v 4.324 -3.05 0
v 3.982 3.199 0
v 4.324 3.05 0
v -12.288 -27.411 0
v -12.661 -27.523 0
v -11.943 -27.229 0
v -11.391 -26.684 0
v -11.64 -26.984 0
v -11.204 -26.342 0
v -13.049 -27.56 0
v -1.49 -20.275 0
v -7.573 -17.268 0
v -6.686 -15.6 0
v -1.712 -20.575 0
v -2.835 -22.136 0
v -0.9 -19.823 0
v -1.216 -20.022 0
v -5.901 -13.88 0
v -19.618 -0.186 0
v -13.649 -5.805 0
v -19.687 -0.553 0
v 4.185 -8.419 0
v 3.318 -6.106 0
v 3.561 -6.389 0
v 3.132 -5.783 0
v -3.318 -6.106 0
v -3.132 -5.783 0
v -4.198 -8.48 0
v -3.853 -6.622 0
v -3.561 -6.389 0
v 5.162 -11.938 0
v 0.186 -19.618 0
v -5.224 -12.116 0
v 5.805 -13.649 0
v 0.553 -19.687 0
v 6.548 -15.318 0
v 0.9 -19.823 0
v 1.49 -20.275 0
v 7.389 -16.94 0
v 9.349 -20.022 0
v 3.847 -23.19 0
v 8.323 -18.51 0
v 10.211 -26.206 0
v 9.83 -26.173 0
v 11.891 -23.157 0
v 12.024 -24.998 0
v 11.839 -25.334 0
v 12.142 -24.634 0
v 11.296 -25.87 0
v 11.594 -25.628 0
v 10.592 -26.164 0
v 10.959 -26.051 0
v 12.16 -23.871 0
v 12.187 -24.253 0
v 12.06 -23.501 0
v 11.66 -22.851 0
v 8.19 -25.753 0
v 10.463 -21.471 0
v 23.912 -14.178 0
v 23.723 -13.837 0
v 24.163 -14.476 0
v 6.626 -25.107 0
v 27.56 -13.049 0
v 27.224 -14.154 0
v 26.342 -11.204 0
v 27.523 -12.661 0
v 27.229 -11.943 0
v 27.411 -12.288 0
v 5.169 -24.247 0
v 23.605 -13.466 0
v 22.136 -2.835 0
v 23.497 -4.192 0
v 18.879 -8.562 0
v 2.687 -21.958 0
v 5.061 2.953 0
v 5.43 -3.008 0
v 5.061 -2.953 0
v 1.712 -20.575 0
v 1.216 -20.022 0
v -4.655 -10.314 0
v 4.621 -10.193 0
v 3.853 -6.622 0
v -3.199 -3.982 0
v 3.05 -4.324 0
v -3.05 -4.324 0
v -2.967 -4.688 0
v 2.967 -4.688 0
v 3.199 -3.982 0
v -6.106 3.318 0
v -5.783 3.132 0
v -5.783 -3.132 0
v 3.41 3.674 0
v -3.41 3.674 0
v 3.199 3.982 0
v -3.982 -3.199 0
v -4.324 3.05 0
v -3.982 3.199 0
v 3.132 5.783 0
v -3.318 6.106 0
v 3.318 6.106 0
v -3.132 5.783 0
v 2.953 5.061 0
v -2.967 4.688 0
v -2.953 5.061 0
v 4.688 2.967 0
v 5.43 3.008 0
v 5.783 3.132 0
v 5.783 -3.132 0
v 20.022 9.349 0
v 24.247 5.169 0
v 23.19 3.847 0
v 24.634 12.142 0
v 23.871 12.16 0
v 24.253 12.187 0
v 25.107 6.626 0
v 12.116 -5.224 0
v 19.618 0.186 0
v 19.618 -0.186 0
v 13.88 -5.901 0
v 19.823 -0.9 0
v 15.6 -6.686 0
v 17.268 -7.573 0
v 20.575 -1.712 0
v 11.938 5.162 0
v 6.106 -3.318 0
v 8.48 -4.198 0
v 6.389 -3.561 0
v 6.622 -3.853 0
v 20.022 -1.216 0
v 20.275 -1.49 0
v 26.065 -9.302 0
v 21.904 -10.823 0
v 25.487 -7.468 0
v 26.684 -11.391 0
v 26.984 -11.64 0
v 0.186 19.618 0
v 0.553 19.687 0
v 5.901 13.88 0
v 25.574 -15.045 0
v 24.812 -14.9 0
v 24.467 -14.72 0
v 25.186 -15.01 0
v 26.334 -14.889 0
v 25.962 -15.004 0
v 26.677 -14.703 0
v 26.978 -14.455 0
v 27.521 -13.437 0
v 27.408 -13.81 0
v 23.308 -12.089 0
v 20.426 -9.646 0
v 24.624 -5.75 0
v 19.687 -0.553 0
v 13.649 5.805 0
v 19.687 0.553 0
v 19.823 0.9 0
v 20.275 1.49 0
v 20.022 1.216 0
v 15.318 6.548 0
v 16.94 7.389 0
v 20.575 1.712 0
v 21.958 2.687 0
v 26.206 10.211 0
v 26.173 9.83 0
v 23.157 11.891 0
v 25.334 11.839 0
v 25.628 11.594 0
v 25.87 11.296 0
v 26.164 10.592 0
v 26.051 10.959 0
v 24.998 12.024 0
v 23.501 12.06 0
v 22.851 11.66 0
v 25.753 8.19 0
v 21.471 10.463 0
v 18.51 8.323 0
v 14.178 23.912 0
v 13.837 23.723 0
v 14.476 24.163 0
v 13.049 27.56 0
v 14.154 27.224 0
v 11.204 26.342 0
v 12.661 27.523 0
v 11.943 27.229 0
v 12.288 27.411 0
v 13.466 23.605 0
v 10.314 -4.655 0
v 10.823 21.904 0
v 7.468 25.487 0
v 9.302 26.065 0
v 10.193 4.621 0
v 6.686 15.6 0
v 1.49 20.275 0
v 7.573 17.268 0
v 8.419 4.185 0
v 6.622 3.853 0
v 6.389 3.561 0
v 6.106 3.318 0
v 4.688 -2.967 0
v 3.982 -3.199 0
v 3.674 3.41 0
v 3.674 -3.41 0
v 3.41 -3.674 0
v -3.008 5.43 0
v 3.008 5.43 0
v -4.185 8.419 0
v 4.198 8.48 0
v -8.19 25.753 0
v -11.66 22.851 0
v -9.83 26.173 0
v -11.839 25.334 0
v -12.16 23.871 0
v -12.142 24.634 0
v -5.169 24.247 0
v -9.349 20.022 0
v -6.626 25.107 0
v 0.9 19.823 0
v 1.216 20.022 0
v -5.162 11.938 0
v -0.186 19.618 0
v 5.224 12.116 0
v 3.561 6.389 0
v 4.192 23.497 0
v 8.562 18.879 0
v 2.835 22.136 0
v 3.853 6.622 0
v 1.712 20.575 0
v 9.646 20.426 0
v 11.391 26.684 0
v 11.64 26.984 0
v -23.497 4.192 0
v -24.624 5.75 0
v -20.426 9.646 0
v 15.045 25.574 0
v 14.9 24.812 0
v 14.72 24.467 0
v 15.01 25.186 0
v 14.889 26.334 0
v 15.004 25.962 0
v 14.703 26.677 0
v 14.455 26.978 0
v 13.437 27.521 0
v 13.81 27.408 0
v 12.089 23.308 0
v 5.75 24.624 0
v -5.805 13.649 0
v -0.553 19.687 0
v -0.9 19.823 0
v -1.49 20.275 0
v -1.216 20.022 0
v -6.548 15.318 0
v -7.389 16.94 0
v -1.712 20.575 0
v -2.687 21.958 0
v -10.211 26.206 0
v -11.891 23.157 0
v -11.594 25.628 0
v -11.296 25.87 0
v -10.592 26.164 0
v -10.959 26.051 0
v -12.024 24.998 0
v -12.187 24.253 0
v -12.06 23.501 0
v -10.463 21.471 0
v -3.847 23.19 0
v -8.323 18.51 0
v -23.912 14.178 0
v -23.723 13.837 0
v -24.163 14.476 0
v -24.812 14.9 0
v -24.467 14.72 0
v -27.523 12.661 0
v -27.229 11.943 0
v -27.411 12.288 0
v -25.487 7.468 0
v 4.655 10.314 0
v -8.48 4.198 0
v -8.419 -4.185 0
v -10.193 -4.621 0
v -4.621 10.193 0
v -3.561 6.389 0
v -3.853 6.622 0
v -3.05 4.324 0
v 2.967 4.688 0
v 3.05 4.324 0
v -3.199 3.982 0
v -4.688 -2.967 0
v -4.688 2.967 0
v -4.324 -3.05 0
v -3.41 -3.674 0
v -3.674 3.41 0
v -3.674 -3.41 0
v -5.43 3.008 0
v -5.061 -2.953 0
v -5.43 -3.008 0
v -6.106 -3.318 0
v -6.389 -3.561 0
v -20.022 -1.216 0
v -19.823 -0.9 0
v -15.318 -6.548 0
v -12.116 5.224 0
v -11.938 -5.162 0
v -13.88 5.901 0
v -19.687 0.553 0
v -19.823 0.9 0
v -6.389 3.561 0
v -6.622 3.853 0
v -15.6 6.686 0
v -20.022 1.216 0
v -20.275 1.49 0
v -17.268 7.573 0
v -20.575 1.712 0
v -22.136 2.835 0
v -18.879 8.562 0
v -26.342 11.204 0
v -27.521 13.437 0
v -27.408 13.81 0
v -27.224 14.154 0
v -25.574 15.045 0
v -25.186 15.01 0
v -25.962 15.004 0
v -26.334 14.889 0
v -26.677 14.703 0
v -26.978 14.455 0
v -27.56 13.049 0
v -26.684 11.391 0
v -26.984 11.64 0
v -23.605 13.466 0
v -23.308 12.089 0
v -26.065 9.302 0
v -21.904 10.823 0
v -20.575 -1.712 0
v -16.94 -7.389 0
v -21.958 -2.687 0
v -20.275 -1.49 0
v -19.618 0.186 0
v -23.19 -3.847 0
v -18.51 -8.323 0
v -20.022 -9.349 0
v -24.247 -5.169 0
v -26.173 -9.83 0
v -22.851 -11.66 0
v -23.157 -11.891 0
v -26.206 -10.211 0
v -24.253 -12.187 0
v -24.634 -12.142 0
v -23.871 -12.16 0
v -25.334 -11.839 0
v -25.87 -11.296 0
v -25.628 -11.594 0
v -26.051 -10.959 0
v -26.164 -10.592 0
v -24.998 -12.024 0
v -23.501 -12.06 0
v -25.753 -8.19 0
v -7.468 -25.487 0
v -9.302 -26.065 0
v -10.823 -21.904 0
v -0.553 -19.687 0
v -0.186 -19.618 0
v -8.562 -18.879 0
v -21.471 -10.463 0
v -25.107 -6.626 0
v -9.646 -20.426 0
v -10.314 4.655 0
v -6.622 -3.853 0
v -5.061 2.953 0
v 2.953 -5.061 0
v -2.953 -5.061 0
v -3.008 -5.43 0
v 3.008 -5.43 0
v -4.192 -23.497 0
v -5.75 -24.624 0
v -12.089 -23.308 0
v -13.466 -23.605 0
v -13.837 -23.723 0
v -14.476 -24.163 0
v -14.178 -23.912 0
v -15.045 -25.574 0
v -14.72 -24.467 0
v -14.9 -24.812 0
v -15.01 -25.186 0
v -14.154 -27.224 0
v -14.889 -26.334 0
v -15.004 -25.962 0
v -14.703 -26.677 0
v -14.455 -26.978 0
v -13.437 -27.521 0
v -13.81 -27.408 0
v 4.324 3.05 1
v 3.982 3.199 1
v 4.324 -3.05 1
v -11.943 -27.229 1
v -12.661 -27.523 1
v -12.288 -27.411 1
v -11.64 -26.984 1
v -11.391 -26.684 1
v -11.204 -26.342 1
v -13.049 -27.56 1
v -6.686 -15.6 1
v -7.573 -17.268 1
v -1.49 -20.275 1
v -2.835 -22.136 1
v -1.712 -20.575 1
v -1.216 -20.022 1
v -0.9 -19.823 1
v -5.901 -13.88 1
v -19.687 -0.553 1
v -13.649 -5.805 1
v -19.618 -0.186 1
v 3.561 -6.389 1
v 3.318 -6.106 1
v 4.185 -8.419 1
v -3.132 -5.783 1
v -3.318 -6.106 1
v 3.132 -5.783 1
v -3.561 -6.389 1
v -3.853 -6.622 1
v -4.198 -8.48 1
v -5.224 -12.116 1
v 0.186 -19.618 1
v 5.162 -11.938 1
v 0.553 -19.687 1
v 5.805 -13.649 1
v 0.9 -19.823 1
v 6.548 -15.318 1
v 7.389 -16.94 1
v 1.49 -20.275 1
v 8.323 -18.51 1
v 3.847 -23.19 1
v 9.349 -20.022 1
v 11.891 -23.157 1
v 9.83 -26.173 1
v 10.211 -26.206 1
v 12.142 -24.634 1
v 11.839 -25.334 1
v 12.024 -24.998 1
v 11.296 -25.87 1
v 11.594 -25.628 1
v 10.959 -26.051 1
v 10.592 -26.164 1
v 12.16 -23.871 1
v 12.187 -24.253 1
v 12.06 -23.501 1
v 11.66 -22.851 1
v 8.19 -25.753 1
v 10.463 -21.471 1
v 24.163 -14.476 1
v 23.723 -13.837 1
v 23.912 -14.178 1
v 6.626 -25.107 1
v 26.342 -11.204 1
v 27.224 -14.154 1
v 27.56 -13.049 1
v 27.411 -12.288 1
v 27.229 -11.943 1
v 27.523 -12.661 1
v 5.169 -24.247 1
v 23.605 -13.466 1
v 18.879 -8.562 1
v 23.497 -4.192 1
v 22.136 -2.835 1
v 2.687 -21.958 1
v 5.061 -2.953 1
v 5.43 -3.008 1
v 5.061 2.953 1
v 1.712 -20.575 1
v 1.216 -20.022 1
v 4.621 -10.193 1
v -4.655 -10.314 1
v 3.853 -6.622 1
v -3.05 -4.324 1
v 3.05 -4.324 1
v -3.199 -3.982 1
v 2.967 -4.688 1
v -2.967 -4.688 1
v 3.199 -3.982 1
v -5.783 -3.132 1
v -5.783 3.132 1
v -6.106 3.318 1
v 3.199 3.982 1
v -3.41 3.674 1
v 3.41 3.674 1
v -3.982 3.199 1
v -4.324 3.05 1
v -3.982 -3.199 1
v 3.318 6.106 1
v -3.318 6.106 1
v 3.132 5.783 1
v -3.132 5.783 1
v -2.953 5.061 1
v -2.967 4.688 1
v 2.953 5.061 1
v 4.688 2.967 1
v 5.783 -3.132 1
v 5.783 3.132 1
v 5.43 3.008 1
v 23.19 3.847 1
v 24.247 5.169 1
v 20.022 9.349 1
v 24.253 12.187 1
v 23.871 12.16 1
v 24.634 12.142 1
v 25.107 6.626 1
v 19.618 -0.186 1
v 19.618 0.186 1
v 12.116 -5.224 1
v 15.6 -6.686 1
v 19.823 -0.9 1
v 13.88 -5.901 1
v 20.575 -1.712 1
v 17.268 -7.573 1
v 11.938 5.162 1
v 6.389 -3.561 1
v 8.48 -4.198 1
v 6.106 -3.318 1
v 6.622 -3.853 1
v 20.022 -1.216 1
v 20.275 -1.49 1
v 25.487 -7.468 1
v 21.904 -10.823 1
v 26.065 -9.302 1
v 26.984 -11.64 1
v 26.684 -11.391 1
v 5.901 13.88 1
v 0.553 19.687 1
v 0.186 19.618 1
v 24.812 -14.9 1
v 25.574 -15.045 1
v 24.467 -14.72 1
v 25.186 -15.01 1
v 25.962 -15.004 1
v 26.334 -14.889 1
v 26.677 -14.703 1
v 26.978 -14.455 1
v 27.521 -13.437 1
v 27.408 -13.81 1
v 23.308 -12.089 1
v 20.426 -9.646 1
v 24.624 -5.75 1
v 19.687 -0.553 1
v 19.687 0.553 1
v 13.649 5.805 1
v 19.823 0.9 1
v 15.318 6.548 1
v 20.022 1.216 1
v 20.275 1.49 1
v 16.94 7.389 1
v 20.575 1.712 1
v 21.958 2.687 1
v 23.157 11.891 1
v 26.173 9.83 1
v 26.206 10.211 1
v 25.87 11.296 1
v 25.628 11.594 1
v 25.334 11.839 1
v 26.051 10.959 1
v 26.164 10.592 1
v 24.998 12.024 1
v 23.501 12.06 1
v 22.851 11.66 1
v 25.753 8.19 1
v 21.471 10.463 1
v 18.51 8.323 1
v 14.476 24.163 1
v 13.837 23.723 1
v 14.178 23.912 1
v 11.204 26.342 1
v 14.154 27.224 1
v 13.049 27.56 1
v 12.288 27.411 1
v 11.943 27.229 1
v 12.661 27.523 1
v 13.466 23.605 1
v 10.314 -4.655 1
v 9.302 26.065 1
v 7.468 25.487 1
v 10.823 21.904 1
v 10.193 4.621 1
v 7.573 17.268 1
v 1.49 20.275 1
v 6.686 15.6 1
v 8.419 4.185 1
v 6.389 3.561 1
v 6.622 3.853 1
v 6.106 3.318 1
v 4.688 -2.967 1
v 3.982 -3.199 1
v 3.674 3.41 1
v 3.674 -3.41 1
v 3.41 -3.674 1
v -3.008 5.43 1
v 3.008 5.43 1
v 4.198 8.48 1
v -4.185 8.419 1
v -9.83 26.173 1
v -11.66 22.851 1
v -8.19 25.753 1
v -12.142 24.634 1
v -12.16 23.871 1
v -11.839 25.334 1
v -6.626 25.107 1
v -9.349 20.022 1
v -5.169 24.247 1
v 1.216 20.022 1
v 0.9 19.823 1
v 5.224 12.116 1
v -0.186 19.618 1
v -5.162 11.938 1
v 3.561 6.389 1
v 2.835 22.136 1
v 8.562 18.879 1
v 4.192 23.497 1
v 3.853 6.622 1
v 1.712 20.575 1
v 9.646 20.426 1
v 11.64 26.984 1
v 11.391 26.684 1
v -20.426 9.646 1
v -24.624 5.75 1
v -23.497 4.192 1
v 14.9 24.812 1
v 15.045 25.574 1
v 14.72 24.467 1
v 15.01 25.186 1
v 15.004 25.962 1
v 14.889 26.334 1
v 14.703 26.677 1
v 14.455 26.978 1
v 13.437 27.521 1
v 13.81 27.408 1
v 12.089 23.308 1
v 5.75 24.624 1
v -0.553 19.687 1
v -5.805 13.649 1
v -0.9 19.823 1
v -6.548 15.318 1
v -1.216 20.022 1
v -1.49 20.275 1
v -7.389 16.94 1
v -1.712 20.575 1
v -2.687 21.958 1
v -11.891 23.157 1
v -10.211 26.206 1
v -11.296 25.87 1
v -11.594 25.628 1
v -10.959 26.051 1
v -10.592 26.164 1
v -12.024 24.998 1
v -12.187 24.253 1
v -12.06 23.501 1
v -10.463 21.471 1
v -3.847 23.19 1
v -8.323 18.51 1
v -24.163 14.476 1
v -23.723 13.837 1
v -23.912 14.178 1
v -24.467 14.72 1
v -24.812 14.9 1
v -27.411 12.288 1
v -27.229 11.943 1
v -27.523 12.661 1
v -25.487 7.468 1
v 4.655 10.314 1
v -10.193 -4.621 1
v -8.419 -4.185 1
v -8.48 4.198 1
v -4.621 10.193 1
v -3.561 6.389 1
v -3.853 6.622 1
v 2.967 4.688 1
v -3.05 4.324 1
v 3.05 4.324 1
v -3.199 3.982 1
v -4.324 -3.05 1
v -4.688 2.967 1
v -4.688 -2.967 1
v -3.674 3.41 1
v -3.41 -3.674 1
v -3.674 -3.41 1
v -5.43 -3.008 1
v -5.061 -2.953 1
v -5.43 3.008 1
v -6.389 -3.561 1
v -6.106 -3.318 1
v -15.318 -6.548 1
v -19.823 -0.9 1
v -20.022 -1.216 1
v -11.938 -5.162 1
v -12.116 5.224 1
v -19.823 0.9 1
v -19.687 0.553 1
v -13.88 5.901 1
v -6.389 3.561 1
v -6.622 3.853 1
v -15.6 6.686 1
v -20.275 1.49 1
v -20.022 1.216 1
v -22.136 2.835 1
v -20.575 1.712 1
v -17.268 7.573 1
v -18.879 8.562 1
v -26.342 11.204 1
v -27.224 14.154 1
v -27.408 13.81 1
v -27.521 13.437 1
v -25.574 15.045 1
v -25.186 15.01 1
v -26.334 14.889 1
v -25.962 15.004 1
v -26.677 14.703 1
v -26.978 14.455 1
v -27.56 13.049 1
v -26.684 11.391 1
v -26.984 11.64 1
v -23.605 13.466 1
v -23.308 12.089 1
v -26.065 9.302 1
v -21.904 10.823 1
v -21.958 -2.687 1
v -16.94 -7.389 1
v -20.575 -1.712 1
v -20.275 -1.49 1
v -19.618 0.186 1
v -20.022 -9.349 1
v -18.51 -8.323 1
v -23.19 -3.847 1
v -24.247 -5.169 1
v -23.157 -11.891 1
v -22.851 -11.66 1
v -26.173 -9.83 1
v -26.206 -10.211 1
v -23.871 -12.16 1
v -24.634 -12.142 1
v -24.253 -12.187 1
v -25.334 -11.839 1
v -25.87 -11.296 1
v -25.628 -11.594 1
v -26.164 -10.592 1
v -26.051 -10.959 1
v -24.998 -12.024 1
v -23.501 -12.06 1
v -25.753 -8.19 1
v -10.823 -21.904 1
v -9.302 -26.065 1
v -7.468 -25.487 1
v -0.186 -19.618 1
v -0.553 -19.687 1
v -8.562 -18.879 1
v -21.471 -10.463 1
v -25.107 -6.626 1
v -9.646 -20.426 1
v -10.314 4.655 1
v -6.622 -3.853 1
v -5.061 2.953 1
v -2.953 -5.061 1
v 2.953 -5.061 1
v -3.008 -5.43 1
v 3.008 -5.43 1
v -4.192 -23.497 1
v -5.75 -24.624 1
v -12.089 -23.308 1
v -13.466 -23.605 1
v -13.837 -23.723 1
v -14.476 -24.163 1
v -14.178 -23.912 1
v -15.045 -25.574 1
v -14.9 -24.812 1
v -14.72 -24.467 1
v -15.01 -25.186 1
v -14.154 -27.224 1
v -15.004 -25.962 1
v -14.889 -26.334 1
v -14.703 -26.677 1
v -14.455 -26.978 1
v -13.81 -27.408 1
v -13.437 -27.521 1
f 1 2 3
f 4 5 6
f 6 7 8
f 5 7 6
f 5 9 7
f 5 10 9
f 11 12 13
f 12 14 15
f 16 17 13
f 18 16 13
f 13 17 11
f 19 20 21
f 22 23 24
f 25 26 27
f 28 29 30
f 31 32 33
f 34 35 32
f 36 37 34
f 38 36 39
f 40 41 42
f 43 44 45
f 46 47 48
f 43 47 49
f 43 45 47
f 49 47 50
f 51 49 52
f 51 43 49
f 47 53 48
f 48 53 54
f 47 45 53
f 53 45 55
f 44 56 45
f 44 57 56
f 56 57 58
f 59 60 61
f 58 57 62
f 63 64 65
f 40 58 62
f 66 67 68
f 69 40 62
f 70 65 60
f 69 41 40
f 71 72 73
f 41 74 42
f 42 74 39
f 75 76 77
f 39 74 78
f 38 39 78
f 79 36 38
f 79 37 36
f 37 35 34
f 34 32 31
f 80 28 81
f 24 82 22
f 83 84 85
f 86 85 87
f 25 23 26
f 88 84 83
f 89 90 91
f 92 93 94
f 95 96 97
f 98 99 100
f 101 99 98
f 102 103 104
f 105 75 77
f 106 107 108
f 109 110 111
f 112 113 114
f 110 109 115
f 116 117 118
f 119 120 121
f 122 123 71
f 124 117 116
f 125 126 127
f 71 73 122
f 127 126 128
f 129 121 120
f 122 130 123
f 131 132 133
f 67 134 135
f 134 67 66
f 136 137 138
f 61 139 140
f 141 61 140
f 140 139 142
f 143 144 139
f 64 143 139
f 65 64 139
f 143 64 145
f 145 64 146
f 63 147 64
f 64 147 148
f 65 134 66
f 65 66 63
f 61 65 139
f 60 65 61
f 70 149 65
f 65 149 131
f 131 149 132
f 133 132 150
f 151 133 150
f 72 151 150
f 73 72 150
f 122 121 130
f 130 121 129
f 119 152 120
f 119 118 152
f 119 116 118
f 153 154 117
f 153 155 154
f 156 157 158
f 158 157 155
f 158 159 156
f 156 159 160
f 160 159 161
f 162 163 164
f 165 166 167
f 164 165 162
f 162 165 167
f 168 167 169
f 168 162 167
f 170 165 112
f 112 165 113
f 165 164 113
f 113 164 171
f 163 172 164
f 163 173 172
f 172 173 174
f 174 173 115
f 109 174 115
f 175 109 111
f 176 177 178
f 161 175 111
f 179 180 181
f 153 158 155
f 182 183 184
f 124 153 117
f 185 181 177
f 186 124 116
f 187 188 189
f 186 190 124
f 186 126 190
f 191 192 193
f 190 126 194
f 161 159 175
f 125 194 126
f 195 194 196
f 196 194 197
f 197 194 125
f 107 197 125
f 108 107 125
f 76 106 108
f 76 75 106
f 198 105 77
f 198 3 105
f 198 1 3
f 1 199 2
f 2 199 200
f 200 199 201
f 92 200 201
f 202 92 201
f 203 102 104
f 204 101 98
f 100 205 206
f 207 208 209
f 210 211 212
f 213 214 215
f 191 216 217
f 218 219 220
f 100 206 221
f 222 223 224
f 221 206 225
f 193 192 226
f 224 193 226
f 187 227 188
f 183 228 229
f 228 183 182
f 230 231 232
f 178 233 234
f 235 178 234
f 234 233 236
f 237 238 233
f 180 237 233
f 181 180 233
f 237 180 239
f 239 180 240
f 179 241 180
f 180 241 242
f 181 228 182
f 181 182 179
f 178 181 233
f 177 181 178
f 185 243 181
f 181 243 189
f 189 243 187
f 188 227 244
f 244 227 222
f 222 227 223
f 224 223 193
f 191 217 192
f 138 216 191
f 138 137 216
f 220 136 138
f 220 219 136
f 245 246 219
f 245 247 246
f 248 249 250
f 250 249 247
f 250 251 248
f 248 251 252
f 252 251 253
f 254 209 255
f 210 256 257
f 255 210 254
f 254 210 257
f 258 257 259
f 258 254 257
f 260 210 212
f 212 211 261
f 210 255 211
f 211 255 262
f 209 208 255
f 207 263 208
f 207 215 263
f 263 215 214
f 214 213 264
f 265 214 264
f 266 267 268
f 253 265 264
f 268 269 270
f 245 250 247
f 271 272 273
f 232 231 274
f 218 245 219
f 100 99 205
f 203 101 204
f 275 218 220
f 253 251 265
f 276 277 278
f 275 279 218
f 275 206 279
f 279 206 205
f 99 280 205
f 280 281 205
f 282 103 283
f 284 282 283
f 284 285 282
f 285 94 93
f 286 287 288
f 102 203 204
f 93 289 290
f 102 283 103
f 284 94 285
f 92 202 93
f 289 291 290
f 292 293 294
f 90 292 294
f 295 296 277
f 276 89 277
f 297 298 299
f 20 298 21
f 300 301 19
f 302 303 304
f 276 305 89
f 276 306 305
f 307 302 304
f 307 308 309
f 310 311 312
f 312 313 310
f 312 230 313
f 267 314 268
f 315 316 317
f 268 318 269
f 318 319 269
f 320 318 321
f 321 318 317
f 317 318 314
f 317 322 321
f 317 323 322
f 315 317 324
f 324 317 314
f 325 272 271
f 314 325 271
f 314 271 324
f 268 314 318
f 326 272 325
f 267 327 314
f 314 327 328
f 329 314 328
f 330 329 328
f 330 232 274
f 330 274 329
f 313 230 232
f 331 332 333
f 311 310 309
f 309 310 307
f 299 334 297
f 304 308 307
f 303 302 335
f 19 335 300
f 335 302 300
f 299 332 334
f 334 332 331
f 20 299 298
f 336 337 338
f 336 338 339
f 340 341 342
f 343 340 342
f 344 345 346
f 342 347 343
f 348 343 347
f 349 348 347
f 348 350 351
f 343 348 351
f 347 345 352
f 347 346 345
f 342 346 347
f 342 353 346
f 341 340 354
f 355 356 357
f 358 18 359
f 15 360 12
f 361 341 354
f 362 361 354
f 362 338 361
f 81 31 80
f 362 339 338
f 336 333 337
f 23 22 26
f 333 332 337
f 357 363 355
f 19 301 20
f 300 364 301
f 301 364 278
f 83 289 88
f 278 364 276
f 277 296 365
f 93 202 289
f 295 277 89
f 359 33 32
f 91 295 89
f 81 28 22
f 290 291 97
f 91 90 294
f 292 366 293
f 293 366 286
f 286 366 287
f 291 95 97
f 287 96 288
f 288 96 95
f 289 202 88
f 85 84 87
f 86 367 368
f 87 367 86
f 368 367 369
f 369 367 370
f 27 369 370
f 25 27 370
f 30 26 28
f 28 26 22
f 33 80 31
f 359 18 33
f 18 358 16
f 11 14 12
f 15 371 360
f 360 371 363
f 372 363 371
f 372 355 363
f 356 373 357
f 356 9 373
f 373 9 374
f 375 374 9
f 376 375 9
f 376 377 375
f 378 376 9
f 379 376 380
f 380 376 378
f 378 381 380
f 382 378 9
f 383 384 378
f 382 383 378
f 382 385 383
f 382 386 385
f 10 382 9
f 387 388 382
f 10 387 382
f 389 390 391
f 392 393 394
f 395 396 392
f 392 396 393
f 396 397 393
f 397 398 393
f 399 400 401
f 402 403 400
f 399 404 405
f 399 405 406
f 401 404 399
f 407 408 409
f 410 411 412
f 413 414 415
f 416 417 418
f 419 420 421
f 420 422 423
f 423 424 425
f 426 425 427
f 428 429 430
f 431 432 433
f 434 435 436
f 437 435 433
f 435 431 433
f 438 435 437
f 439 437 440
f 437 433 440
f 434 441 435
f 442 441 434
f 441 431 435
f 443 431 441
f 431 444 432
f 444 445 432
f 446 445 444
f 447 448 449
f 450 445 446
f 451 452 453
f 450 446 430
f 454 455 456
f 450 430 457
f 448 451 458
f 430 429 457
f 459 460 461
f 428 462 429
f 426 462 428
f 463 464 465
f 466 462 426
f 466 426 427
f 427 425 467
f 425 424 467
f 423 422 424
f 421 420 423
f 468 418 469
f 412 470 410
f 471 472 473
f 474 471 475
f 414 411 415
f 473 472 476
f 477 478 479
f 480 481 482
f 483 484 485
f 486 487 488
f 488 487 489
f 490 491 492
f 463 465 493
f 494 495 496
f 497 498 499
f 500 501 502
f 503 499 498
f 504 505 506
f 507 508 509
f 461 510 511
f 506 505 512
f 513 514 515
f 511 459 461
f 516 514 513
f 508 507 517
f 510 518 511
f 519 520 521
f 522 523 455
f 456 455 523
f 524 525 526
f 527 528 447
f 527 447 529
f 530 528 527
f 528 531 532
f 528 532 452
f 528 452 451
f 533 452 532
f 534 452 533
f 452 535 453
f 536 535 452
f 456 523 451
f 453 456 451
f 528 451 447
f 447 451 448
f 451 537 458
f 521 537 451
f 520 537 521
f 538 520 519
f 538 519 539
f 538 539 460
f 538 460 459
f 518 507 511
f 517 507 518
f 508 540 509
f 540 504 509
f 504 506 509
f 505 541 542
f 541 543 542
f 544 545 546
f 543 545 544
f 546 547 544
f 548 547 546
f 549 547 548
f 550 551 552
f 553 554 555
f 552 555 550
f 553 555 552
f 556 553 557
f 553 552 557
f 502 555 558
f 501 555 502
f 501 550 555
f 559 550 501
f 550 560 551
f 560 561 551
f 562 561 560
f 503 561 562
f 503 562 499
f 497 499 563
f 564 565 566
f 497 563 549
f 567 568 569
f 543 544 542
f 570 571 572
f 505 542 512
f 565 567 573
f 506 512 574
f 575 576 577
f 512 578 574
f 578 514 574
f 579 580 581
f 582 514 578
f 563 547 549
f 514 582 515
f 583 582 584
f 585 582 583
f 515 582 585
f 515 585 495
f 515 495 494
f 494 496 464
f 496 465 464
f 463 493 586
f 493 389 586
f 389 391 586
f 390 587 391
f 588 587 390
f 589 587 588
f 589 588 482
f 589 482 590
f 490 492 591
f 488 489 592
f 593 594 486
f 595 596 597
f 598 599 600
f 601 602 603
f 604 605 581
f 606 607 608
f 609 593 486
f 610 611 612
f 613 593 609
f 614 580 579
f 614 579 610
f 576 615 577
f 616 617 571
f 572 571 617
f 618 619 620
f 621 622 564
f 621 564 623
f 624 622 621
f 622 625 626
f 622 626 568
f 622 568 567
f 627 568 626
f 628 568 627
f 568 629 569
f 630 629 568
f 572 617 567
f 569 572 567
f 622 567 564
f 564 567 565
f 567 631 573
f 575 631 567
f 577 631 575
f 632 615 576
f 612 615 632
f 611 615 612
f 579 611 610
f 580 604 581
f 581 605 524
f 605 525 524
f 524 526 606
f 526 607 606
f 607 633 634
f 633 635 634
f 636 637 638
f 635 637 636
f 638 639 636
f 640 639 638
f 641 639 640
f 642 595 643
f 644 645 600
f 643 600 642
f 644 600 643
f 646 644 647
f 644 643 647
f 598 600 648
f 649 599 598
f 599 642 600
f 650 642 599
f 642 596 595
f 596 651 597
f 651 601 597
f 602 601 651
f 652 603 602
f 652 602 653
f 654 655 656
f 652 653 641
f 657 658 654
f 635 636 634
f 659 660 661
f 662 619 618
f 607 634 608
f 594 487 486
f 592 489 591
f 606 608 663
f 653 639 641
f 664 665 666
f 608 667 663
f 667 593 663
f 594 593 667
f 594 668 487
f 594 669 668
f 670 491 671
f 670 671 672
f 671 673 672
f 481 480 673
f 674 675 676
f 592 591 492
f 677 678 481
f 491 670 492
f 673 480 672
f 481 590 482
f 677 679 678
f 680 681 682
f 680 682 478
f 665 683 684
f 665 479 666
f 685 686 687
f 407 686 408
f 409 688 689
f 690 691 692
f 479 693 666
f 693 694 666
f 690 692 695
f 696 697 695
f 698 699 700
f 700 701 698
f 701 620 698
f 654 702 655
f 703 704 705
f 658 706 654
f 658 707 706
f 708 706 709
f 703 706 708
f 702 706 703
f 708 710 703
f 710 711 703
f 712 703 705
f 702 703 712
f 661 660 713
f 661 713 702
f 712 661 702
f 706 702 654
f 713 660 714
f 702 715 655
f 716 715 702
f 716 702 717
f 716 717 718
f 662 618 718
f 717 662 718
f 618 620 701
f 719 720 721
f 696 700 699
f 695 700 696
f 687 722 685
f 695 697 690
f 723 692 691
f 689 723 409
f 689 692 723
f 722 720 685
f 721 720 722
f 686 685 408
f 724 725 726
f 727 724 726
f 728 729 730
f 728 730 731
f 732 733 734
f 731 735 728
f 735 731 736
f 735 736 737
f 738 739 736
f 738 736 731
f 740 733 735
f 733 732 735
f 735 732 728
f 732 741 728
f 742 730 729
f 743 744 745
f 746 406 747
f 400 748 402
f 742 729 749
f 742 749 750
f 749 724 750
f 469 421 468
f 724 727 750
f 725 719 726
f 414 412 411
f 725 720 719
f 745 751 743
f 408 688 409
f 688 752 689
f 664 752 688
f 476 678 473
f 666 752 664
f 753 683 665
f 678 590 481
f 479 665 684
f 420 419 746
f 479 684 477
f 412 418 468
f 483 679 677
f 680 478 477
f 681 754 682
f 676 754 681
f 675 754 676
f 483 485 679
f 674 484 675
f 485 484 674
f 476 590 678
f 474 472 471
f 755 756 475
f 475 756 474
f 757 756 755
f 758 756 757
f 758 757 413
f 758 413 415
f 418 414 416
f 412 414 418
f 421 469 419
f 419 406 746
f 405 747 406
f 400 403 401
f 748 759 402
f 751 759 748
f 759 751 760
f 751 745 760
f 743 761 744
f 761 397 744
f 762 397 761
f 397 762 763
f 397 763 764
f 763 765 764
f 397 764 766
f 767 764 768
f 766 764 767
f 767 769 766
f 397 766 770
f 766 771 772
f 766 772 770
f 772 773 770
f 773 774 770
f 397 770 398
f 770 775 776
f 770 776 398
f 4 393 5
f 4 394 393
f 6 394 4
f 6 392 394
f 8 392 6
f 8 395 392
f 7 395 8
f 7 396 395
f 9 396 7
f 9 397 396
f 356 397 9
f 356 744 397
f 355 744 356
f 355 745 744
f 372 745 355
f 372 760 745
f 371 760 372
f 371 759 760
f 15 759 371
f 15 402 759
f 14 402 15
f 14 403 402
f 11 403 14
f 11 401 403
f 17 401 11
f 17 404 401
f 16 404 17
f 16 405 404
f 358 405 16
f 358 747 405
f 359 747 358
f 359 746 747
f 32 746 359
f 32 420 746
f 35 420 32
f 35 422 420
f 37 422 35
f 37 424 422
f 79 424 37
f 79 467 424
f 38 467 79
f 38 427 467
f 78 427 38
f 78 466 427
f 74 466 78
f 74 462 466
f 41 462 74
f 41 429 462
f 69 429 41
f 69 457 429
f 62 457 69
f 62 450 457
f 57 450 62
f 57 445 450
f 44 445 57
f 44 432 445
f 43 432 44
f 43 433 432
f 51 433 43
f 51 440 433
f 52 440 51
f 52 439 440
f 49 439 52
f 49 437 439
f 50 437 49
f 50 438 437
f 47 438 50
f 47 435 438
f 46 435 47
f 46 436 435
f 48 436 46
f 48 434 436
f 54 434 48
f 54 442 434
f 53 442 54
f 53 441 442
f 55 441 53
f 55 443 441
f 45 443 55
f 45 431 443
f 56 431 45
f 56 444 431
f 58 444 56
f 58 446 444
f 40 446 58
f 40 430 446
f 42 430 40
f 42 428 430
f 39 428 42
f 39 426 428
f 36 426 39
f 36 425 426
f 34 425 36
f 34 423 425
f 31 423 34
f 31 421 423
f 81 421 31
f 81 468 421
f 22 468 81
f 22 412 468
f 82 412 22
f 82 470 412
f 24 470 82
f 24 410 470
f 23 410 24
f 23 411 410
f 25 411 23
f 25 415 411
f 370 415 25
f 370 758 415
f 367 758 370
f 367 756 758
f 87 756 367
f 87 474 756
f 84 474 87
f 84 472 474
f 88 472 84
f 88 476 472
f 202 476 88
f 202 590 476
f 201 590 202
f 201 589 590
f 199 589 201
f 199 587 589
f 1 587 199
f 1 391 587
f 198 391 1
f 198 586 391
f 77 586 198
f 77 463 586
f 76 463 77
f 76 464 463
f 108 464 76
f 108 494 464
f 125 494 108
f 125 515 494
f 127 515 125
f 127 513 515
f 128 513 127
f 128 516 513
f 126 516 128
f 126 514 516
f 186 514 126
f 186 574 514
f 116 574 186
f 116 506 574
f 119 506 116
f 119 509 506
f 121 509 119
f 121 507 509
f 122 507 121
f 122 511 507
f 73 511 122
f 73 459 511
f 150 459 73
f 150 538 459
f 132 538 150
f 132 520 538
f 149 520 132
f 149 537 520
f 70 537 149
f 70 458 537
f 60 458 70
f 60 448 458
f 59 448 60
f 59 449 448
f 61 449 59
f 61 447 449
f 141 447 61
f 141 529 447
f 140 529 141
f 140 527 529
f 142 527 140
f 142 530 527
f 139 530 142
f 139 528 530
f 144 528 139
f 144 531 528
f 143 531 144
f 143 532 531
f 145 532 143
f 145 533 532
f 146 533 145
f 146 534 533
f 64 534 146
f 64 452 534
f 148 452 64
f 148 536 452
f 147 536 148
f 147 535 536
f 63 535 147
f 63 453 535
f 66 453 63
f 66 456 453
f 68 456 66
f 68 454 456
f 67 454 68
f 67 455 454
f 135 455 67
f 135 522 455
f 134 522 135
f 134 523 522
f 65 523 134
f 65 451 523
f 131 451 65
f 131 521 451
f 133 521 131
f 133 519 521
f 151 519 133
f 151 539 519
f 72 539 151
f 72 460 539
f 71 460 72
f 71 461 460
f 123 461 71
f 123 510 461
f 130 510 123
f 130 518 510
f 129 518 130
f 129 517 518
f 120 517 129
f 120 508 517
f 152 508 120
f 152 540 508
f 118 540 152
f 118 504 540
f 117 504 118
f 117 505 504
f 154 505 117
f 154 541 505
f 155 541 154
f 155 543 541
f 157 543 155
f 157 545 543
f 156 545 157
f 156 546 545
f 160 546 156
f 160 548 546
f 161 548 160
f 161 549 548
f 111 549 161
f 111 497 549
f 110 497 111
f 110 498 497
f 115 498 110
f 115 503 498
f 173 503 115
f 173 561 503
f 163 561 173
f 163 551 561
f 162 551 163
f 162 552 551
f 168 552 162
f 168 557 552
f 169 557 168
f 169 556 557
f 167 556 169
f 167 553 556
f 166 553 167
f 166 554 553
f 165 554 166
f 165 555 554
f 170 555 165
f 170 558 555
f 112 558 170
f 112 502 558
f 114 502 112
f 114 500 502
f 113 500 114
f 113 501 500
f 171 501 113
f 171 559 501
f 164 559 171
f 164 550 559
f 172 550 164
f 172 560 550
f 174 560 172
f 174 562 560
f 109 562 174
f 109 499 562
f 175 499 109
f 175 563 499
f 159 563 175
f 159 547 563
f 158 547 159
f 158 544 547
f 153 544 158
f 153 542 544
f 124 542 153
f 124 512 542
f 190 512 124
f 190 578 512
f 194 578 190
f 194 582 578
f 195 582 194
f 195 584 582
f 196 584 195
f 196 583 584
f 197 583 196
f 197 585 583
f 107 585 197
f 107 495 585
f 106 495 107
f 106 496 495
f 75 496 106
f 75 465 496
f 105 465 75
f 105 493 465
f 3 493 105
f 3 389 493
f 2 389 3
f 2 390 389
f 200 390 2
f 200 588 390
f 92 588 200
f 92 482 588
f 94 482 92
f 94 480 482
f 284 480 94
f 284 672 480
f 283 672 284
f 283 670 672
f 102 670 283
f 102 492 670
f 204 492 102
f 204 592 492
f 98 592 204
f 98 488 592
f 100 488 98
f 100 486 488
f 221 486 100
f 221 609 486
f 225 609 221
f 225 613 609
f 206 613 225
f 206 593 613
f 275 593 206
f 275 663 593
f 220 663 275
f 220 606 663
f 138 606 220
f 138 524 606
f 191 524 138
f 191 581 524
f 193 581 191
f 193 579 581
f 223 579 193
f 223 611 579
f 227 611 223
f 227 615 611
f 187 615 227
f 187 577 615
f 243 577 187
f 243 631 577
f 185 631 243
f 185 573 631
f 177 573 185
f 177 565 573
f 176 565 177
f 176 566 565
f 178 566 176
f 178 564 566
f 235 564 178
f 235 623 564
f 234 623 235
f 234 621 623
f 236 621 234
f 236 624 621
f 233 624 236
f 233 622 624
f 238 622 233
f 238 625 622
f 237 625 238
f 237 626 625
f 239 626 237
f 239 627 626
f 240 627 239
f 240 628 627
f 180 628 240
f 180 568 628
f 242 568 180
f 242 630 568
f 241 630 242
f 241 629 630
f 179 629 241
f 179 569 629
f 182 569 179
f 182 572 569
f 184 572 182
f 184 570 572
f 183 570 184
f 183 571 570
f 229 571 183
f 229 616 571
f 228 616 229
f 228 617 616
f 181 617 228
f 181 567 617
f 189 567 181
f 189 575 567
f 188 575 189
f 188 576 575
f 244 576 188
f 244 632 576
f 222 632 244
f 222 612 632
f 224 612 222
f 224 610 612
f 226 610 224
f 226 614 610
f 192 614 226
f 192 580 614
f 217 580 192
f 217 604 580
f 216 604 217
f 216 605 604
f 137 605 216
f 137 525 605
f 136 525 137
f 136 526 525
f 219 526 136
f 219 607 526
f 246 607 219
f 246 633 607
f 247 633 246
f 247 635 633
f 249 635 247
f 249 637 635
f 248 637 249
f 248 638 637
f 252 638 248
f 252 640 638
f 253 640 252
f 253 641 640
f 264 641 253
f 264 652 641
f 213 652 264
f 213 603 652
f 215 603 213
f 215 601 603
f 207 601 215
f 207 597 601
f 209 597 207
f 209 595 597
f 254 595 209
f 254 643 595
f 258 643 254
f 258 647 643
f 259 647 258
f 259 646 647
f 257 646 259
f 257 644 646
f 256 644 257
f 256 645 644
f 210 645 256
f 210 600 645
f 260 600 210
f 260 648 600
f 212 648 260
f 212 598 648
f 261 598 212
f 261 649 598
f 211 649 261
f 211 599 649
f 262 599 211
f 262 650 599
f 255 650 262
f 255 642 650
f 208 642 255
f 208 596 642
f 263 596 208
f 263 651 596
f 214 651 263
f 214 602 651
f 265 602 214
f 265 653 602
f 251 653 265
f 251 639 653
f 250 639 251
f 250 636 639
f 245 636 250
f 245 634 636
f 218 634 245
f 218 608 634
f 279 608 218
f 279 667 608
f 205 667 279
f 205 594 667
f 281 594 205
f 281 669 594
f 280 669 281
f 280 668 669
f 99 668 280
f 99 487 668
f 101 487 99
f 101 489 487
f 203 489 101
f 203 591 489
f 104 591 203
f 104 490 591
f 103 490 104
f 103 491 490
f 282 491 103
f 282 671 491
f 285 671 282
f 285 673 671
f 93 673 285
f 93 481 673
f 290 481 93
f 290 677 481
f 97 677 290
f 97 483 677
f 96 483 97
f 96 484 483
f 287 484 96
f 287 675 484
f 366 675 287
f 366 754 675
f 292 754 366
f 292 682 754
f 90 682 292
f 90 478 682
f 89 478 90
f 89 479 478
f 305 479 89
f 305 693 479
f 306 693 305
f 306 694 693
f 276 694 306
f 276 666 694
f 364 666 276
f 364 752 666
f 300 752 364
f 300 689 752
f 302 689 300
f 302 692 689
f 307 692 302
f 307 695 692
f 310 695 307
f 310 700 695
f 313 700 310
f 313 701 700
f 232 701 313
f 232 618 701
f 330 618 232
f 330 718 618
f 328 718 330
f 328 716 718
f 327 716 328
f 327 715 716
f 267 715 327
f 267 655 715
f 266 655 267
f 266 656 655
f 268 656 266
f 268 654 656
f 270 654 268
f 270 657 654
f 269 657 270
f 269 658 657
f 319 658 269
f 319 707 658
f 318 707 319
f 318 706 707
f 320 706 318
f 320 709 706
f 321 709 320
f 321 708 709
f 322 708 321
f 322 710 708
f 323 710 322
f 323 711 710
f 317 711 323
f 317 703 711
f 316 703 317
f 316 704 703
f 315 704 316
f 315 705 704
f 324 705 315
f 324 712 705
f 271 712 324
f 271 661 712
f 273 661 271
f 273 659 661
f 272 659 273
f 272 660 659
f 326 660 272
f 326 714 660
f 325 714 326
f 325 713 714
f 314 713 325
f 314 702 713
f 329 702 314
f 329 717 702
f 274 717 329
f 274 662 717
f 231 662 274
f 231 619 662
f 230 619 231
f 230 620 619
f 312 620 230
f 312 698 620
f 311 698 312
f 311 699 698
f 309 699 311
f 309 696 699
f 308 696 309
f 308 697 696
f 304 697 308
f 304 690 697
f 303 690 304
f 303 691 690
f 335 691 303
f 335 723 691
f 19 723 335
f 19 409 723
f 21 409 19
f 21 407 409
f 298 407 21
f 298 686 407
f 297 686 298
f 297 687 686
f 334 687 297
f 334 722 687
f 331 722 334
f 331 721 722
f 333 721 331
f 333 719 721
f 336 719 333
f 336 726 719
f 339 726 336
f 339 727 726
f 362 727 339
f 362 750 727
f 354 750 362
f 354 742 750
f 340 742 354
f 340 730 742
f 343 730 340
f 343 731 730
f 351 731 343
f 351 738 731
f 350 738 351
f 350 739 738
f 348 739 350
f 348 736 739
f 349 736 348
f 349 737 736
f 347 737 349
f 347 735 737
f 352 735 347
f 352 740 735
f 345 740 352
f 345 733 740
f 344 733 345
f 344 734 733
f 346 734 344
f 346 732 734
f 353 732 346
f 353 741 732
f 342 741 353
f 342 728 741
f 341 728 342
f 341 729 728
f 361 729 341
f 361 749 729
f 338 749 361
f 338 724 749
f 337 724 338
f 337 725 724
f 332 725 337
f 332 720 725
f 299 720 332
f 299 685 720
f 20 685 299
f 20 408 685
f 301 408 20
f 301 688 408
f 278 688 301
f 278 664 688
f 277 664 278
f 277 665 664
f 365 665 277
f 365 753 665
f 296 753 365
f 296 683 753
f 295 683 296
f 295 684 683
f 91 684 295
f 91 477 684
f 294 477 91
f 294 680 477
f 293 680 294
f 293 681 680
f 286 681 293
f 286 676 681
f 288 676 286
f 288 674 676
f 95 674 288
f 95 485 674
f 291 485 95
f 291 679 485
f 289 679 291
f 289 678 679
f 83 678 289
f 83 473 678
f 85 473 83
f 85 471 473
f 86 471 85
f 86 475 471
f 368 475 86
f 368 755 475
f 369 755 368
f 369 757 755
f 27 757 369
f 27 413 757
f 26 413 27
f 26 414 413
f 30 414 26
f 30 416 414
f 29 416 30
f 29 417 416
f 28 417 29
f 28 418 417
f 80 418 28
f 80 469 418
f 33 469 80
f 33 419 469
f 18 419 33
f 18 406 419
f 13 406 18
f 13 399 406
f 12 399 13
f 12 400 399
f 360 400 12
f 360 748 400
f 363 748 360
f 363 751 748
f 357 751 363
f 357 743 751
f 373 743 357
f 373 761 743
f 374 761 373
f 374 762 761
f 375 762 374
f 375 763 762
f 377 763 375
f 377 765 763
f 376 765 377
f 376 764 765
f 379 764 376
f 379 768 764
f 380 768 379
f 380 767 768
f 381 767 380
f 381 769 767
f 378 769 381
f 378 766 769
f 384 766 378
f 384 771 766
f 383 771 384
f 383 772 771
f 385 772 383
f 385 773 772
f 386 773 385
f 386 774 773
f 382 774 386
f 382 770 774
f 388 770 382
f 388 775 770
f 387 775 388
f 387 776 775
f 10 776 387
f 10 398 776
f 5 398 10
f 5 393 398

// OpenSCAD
// Generated by Parametrix
ca_myPartN_face1_000 = [ [ 20.5751, 1.7118 ],[ 21.9582, 2.6869 ],[ 23.1903, 3.8470 ],[ 24.2470, 5.1689 ],[ 25.1070, 6.6263 ],[ 25.7535, 8.1902 ],[ 26.1734, 9.8296 ],[ 26.2056, 10.2115 ],[ 26.1644, 10.5925 ],[ 26.0513, 10.9587 ],[ 25.8704, 11.2965 ],[ 25.6284, 11.5937 ],[ 25.3341, 11.8392 ],[ 24.9985, 12.0241 ],[ 24.6337, 12.1416 ],[ 24.2532, 12.1874 ],[ 23.8710, 12.1597 ],[ 23.5010, 12.0597 ],[ 23.1570, 11.8909 ],[ 22.8514, 11.6596 ],[ 21.4710, 10.4626 ],[ 20.0222, 9.3493 ],[ 18.5103, 8.3235 ],[ 16.9403, 7.3888 ],[ 15.3179, 6.5485 ],[ 13.6487, 5.8055 ],[ 11.9385, 5.1624 ],[ 10.1933, 4.6215 ],[ 8.4192, 4.1846 ],[ 6.6224, 3.8533 ],[ 6.3895, 3.5615 ],[ 6.1064, 3.3181 ],[ 5.7830, 3.1316 ],[ 5.4305, 3.0084 ],[ 5.0614, 2.9529 ],[ 4.6883, 2.9669 ],[ 4.3243, 3.0501 ],[ 3.9822, 3.1994 ],[ 3.6737, 3.4097 ],[ 3.4097, 3.6737 ],[ 3.1994, 3.9822 ],[ 3.0501, 4.3243 ],[ 2.9669, 4.6883 ],[ 2.9529, 5.0614 ],[ 3.0084, 5.4305 ],[ 3.1316, 5.7830 ],[ 3.3181, 6.1064 ],[ 3.5615, 6.3895 ],[ 3.8533, 6.6224 ],[ 4.1978, 8.4805 ],[ 4.6553, 10.3140 ],[ 5.2239, 12.1162 ],[ 5.9015, 13.8802 ],[ 6.6857, 15.5996 ],[ 7.5735, 17.2678 ],[ 8.5616, 18.8787 ],[ 9.6462, 20.4262 ],[ 10.8233, 21.9045 ],[ 12.0886, 23.3082 ],[ 13.4657, 23.6046 ],[ 13.8369, 23.7234 ],[ 14.1780, 23.9118 ],[ 14.4760, 24.1629 ],[ 14.7198, 24.4669 ],[ 14.8999, 24.8125 ],[ 15.0096, 25.1864 ],[ 15.0447, 25.5745 ],[ 15.0039, 25.9621 ],[ 14.8887, 26.3344 ],[ 14.7035, 26.6773 ],[ 14.4554, 26.9777 ],[ 14.1536, 27.2243 ],[ 13.8098, 27.4078 ],[ 13.4369, 27.5210 ],[ 13.0492, 27.5598 ],[ 12.6612, 27.5227 ],[ 12.2879, 27.4111 ],[ 11.9433, 27.2292 ],[ 11.6404, 26.9839 ],[ 11.3910, 26.6845 ],[ 11.2043, 26.3424 ],[ 9.3018, 26.0649 ],[ 7.4681, 25.4871 ],[ 5.7503, 24.6236 ],[ 4.1925, 23.4969 ],[ 2.8347, 22.1357 ],[ 1.7118, 20.5751 ],[ 1.4900, 20.2752 ],[ 1.2163, 20.0217 ],[ 0.9004, 19.8234 ],[ 0.5531, 19.6873 ],[ 0.1865, 19.6180 ],[ -0.1865, 19.6180 ],[ -0.5531, 19.6873 ],[ -0.9004, 19.8234 ],[ -1.2163, 20.0217 ],[ -1.4900, 20.2752 ],[ -1.7118, 20.5751 ],[ -2.6869, 21.9582 ],[ -3.8470, 23.1903 ],[ -5.1689, 24.2470 ],[ -6.6263, 25.1070 ],[ -8.1902, 25.7535 ],[ -9.8296, 26.1734 ],[ -10.2115, 26.2056 ],[ -10.5925, 26.1644 ],[ -10.9587, 26.0513 ],[ -11.2965, 25.8704 ],[ -11.5937, 25.6284 ],[ -11.8392, 25.3341 ],[ -12.0241, 24.9985 ],[ -12.1416, 24.6337 ],[ -12.1874, 24.2532 ],[ -12.1597, 23.8710 ],[ -12.0597, 23.5010 ],[ -11.8909, 23.1570 ],[ -11.6596, 22.8514 ],[ -10.4626, 21.4710 ],[ -9.3493, 20.0222 ],[ -8.3235, 18.5103 ],[ -7.3888, 16.9403 ],[ -6.5485, 15.3179 ],[ -5.8055, 13.6487 ],[ -5.1624, 11.9385 ],[ -4.6215, 10.1933 ],[ -4.1846, 8.4192 ],[ -3.8533, 6.6224 ],[ -3.5615, 6.3895 ],[ -3.3181, 6.1064 ],[ -3.1316, 5.7830 ],[ -3.0084, 5.4305 ],[ -2.9529, 5.0614 ],[ -2.9669, 4.6883 ],[ -3.0501, 4.3243 ],[ -3.1994, 3.9822 ],[ -3.4097, 3.6737 ],[ -3.6737, 3.4097 ],[ -3.9822, 3.1994 ],[ -4.3243, 3.0501 ],[ -4.6883, 2.9669 ],[ -5.0614, 2.9529 ],[ -5.4305, 3.0084 ],[ -5.7830, 3.1316 ],[ -6.1064, 3.3181 ],[ -6.3895, 3.5615 ],[ -6.6224, 3.8533 ],[ -8.4805, 4.1978 ],[ -10.3140, 4.6553 ],[ -12.1162, 5.2239 ],[ -13.8802, 5.9015 ],[ -15.5996, 6.6857 ],[ -17.2678, 7.5735 ],[ -18.8787, 8.5616 ],[ -20.4262, 9.6462 ],[ -21.9045, 10.8233 ],[ -23.3082, 12.0886 ],[ -23.6046, 13.4657 ],[ -23.7234, 13.8369 ],[ -23.9118, 14.1780 ],[ -24.1629, 14.4760 ],[ -24.4669, 14.7198 ],[ -24.8125, 14.8999 ],[ -25.1864, 15.0096 ],[ -25.5745, 15.0447 ],[ -25.9621, 15.0039 ],[ -26.3344, 14.8887 ],[ -26.6773, 14.7035 ],[ -26.9777, 14.4554 ],[ -27.2243, 14.1536 ],[ -27.4078, 13.8098 ],[ -27.5210, 13.4369 ],[ -27.5598, 13.0492 ],[ -27.5227, 12.6612 ],[ -27.4111, 12.2879 ],[ -27.2292, 11.9433 ],[ -26.9839, 11.6404 ],[ -26.6845, 11.3910 ],[ -26.3424, 11.2043 ],[ -26.0649, 9.3018 ],[ -25.4871, 7.4681 ],[ -24.6236, 5.7503 ],[ -23.4969, 4.1925 ],[ -22.1357, 2.8347 ],[ -20.5751, 1.7118 ],[ -20.2752, 1.4900 ],[ -20.0217, 1.2163 ],[ -19.8234, 0.9004 ],[ -19.6873, 0.5531 ],[ -19.6180, 0.1865 ],[ -19.6180, -0.1865 ],[ -19.6873, -0.5531 ],[ -19.8234, -0.9004 ],[ -20.0217, -1.2163 ],[ -20.2752, -1.4900 ],[ -20.5751, -1.7118 ],[ -21.9582, -2.6869 ],[ -23.1903, -3.8470 ],[ -24.2470, -5.1689 ],[ -25.1070, -6.6263 ],[ -25.7535, -8.1902 ],[ -26.1734, -9.8296 ],[ -26.2056, -10.2115 ],[ -26.1644, -10.5925 ],[ -26.0513, -10.9587 ],[ -25.8704, -11.2965 ],[ -25.6284, -11.5937 ],[ -25.3341, -11.8392 ],[ -24.9985, -12.0241 ],[ -24.6337, -12.1416 ],[ -24.2532, -12.1874 ],[ -23.8710, -12.1597 ],[ -23.5010, -12.0597 ],[ -23.1570, -11.8909 ],[ -22.8514, -11.6596 ],[ -21.4710, -10.4626 ],[ -20.0222, -9.3493 ],[ -18.5103, -8.3235 ],[ -16.9403, -7.3888 ],[ -15.3179, -6.5485 ],[ -13.6487, -5.8055 ],[ -11.9385, -5.1624 ],[ -10.1933, -4.6215 ],[ -8.4192, -4.1846 ],[ -6.6224, -3.8533 ],[ -6.3895, -3.5615 ],[ -6.1064, -3.3181 ],[ -5.7830, -3.1316 ],[ -5.4305, -3.0084 ],[ -5.0614, -2.9529 ],[ -4.6883, -2.9669 ],[ -4.3243, -3.0501 ],[ -3.9822, -3.1994 ],[ -3.6737, -3.4097 ],[ -3.4097, -3.6737 ],[ -3.1994, -3.9822 ],[ -3.0501, -4.3243 ],[ -2.9669, -4.6883 ],[ -2.9529, -5.0614 ],[ -3.0084, -5.4305 ],[ -3.1316, -5.7830 ],[ -3.3181, -6.1064 ],[ -3.5615, -6.3895 ],[ -3.8533, -6.6224 ],[ -4.1978, -8.4805 ],[ -4.6553, -10.3140 ],[ -5.2239, -12.1162 ],[ -5.9015, -13.8802 ],[ -6.6857, -15.5996 ],[ -7.5735, -17.2678 ],[ -8.5616, -18.8787 ],[ -9.6462, -20.4262 ],[ -10.8233, -21.9045 ],[ -12.0886, -23.3082 ],[ -13.4657, -23.6046 ],[ -13.8369, -23.7234 ],[ -14.1780, -23.9118 ],[ -14.4760, -24.1629 ],[ -14.7198, -24.4669 ],[ -14.8999, -24.8125 ],[ -15.0096, -25.1864 ],[ -15.0447, -25.5745 ],[ -15.0039, -25.9621 ],[ -14.8887, -26.3344 ],[ -14.7035, -26.6773 ],[ -14.4554, -26.9777 ],[ -14.1536, -27.2243 ],[ -13.8098, -27.4078 ],[ -13.4369, -27.5210 ],[ -13.0492, -27.5598 ],[ -12.6612, -27.5227 ],[ -12.2879, -27.4111 ],[ -11.9433, -27.2292 ],[ -11.6404, -26.9839 ],[ -11.3910, -26.6845 ],[ -11.2043, -26.3424 ],[ -9.3018, -26.0649 ],[ -7.4681, -25.4871 ],[ -5.7503, -24.6236 ],[ -4.1925, -23.4969 ],[ -2.8347, -22.1357 ],[ -1.7118, -20.5751 ],[ -1.4900, -20.2752 ],[ -1.2163, -20.0217 ],[ -0.9004, -19.8234 ],[ -0.5531, -19.6873 ],[ -0.1865, -19.6180 ],[ 0.1865, -19.6180 ],[ 0.5531, -19.6873 ],[ 0.9004, -19.8234 ],[ 1.2163, -20.0217 ],[ 1.4900, -20.2752 ],[ 1.7118, -20.5751 ],[ 2.6869, -21.9582 ],[ 3.8470, -23.1903 ],[ 5.1689, -24.2470 ],[ 6.6263, -25.1070 ],[ 8.1902, -25.7535 ],[ 9.8296, -26.1734 ],[ 10.2115, -26.2056 ],[ 10.5925, -26.1644 ],[ 10.9587, -26.0513 ],[ 11.2965, -25.8704 ],[ 11.5937, -25.6284 ],[ 11.8392, -25.3341 ],[ 12.0241, -24.9985 ],[ 12.1416, -24.6337 ],[ 12.1874, -24.2532 ],[ 12.1597, -23.8710 ],[ 12.0597, -23.5010 ],[ 11.8909, -23.1570 ],[ 11.6596, -22.8514 ],[ 10.4626, -21.4710 ],[ 9.3493, -20.0222 ],[ 8.3235, -18.5103 ],[ 7.3888, -16.9403 ],[ 6.5485, -15.3179 ],[ 5.8055, -13.6487 ],[ 5.1624, -11.9385 ],[ 4.6215, -10.1933 ],[ 4.1846, -8.4192 ],[ 3.8533, -6.6224 ],[ 3.5615, -6.3895 ],[ 3.3181, -6.1064 ],[ 3.1316, -5.7830 ],[ 3.0084, -5.4305 ],[ 2.9529, -5.0614 ],[ 2.9669, -4.6883 ],[ 3.0501, -4.3243 ],[ 3.1994, -3.9822 ],[ 3.4097, -3.6737 ],[ 3.6737, -3.4097 ],[ 3.9822, -3.1994 ],[ 4.3243, -3.0501 ],[ 4.6883, -2.9669 ],[ 5.0614, -2.9529 ],[ 5.4305, -3.0084 ],[ 5.7830, -3.1316 ],[ 6.1064, -3.3181 ],[ 6.3895, -3.5615 ],[ 6.6224, -3.8533 ],[ 8.4805, -4.1978 ],[ 10.3140, -4.6553 ],[ 12.1162, -5.2239 ],[ 13.8802, -5.9015 ],[ 15.5996, -6.6857 ],[ 17.2678, -7.5735 ],[ 18.8787, -8.5616 ],[ 20.4262, -9.6462 ],[ 21.9045, -10.8233 ],[ 23.3082, -12.0886 ],[ 23.6046, -13.4657 ],[ 23.7234, -13.8369 ],[ 23.9118, -14.1780 ],[ 24.1629, -14.4760 ],[ 24.4669, -14.7198 ],[ 24.8125, -14.8999 ],[ 25.1864, -15.0096 ],[ 25.5745, -15.0447 ],[ 25.9621, -15.0039 ],[ 26.3344, -14.8887 ],[ 26.6773, -14.7035 ],[ 26.9777, -14.4554 ],[ 27.2243, -14.1536 ],[ 27.4078, -13.8098 ],[ 27.5210, -13.4369 ],[ 27.5598, -13.0492 ],[ 27.5227, -12.6612 ],[ 27.4111, -12.2879 ],[ 27.2292, -11.9433 ],[ 26.9839, -11.6404 ],[ 26.6845, -11.3910 ],[ 26.3424, -11.2043 ],[ 26.0649, -9.3018 ],[ 25.4871, -7.4681 ],[ 24.6236, -5.7503 ],[ 23.4969, -4.1925 ],[ 22.1357, -2.8347 ],[ 20.5751, -1.7118 ],[ 20.2752, -1.4900 ],[ 20.0217, -1.2163 ],[ 19.8234, -0.9004 ],[ 19.6873, -0.5531 ],[ 19.6180, -0.1865 ],[ 19.6180, 0.1865 ],[ 19.6873, 0.5531 ],[ 19.8234, 0.9004 ],[ 20.0217, 1.2163 ],[ 20.2752, 1.4900 ],[ 20.5751, 1.7118 ] ];
cb_myPartN_face1_000 = [  0, 1, 2, 3, 4, 5, 6, 7, 8, 9, 10, 11, 12, 13, 14, 15, 16, 17, 18, 19, 20, 21, 22, 23, 24, 25, 26, 27, 28, 29, 30, 31, 32, 33, 34, 35, 36, 37, 38, 39, 40, 41, 42, 43, 44, 45, 46, 47, 48, 49, 50, 51, 52, 53, 54, 55, 56, 57, 58, 59, 60, 61, 62, 63, 64, 65, 66, 67, 68, 69, 70, 71, 72, 73, 74, 75, 76, 77, 78, 79, 80, 81, 82, 83, 84, 85, 86, 87, 88, 89, 90, 91, 92, 93, 94, 95, 96, 97, 98, 99, 100, 101, 102, 103, 104, 105, 106, 107, 108, 109, 110, 111, 112, 113, 114, 115, 116, 117, 118, 119, 120, 121, 122, 123, 124, 125, 126, 127, 128, 129, 130, 131, 132, 133, 134, 135, 136, 137, 138, 139, 140, 141, 142, 143, 144, 145, 146, 147, 148, 149, 150, 151, 152, 153, 154, 155, 156, 157, 158, 159, 160, 161, 162, 163, 164, 165, 166, 167, 168, 169, 170, 171, 172, 173, 174, 175, 176, 177, 178, 179, 180, 181, 182, 183, 184, 185, 186, 187, 188, 189, 190, 191, 192, 193, 194, 195, 196, 197, 198, 199, 200, 201, 202, 203, 204, 205, 206, 207, 208, 209, 210, 211, 212, 213, 214, 215, 216, 217, 218, 219, 220, 221, 222, 223, 224, 225, 226, 227, 228, 229, 230, 231, 232, 233, 234, 235, 236, 237, 238, 239, 240, 241, 242, 243, 244, 245, 246, 247, 248, 249, 250, 251, 252, 253, 254, 255, 256, 257, 258, 259, 260, 261, 262, 263, 264, 265, 266, 267, 268, 269, 270, 271, 272, 273, 274, 275, 276, 277, 278, 279, 280, 281, 282, 283, 284, 285, 286, 287, 288, 289, 290, 291, 292, 293, 294, 295, 296, 297, 298, 299, 300, 301, 302, 303, 304, 305, 306, 307, 308, 309, 310, 311, 312, 313, 314, 315, 316, 317, 318, 319, 320, 321, 322, 323, 324, 325, 326, 327, 328, 329, 330, 331, 332, 333, 334, 335, 336, 337, 338, 339, 340, 341, 342, 343, 344, 345, 346, 347, 348, 349, 350, 351, 352, 353, 354, 355, 356, 357, 358, 359, 360, 361, 362, 363, 364, 365, 366, 367, 368, 369, 370, 371, 372, 373, 374, 375, 376, 377, 378, 379, 380, 381, 382, 383, 384, 385, 386, 387, 388 ];
a_myPartN_face1 = concat(ca_myPartN_face1_000);
b_myPartN_face1 = [cb_myPartN_face1_000];

module subpax_myPartN () {
	translate( [ 0, 0, 0 ])
		rotate( [ 0, 0, 0 ])
			   linear_extrude(height = 1) polygon(a_myPartN_face1, b_myPartN_face1);
}

module pax_myPartN () {
	subpax_myPartN();
}

pax_myPartN();
